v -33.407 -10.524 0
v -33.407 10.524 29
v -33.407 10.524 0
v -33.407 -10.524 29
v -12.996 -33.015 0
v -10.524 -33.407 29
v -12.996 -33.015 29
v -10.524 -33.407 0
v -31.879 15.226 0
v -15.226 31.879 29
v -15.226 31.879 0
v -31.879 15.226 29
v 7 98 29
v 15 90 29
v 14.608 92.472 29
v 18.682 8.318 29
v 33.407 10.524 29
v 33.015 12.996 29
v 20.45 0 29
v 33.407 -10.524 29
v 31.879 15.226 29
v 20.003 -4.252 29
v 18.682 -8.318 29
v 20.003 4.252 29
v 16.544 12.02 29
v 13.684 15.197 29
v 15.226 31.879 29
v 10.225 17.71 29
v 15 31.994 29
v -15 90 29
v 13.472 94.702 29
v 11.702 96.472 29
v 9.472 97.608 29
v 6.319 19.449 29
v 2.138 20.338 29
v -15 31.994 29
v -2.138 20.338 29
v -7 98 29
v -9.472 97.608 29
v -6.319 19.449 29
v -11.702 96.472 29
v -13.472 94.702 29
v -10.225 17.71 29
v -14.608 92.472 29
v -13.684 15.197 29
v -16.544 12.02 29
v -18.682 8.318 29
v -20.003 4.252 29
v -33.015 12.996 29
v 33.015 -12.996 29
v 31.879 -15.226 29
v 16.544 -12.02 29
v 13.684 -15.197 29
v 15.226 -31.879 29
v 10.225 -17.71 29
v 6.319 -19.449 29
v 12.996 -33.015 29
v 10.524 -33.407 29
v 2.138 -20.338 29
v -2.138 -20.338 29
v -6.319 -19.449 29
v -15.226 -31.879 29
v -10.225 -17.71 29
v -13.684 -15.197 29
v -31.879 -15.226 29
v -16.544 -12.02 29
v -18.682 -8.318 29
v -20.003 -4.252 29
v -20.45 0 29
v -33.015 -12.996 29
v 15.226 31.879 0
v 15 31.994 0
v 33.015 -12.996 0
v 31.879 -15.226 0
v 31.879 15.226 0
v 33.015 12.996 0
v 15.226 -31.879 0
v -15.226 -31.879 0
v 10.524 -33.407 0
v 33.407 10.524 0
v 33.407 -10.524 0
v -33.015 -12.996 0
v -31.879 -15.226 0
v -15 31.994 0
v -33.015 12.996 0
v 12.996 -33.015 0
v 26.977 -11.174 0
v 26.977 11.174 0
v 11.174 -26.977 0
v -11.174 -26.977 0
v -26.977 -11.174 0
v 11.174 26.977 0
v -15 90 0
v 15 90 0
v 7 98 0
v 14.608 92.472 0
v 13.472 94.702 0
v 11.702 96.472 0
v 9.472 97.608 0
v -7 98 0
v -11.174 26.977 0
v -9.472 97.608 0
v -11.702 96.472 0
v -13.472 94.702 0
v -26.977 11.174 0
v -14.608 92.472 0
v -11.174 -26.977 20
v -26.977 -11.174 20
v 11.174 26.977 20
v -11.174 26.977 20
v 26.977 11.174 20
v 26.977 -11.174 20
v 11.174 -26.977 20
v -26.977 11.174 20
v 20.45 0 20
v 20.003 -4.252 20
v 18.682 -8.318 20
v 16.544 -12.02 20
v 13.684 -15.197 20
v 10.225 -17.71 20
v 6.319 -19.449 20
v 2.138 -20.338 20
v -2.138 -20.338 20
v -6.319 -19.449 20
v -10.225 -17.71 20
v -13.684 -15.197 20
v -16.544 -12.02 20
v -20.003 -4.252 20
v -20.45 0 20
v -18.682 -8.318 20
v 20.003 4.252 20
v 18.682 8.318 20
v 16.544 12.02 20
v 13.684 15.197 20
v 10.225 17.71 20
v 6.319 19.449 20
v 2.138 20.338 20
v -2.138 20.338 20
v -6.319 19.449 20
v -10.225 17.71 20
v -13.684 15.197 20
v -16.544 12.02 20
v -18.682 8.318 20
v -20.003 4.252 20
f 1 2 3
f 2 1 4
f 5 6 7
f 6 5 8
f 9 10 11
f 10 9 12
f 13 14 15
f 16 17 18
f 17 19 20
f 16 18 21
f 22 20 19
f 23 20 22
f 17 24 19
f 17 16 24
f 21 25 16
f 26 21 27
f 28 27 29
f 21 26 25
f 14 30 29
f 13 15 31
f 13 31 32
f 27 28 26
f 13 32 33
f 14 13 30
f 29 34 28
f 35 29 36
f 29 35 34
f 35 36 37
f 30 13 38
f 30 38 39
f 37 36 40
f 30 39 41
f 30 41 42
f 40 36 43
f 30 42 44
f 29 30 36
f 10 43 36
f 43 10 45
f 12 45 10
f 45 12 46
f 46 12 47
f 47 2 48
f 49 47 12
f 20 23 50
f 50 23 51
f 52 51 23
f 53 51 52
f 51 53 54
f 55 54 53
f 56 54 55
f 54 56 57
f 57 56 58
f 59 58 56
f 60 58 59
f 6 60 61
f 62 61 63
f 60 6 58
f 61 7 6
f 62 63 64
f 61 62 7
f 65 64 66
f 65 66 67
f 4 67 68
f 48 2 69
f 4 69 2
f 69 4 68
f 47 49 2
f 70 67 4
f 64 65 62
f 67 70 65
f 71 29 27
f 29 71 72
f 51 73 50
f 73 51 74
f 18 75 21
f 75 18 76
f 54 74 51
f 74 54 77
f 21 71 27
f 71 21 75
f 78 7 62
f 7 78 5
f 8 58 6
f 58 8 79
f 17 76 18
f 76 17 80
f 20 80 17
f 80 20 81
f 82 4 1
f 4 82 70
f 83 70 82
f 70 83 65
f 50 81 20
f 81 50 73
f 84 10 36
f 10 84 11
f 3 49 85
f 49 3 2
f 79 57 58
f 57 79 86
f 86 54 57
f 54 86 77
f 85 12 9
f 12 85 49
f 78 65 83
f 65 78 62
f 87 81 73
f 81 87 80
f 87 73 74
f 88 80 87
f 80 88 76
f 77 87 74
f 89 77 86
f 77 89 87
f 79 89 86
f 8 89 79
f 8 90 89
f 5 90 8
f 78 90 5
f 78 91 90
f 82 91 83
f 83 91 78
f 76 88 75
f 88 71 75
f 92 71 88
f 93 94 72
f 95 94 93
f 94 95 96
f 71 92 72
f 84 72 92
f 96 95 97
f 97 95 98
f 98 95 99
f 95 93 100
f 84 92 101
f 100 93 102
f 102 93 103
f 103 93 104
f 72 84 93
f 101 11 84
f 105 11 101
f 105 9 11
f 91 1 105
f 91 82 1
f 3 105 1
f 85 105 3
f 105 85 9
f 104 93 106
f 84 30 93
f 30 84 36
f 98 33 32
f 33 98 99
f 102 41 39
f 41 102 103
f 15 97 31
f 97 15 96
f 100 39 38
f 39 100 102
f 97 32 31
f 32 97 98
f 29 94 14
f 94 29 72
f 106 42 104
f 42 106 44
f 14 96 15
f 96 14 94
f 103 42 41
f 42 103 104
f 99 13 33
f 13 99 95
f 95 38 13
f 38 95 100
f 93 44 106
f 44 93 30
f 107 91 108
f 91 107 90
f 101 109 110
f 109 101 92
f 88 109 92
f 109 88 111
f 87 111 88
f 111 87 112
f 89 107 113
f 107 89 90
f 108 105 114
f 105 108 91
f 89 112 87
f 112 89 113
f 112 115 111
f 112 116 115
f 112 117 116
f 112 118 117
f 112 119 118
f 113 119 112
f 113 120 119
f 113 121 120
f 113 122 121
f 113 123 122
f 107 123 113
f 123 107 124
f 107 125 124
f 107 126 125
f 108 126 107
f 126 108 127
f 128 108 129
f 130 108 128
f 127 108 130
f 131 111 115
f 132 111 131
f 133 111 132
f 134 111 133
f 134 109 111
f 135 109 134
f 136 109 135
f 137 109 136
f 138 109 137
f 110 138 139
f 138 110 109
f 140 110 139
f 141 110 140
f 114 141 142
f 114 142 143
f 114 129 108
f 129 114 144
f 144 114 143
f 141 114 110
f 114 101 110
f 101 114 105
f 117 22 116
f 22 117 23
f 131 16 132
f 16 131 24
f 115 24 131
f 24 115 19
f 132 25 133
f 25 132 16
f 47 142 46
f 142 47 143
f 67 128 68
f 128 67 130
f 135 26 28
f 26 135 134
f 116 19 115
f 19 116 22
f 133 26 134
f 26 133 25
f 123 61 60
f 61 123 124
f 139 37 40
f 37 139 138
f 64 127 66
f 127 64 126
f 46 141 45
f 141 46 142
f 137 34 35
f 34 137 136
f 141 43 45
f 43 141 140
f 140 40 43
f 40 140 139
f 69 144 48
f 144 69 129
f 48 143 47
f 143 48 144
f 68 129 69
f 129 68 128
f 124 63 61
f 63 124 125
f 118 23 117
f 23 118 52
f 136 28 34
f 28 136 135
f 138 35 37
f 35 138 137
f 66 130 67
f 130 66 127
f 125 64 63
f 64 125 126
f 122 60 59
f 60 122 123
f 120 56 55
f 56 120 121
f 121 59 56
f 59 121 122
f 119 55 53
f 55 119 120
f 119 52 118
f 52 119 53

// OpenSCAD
he = 9; // height of the end of the tap
ho = 20; // height of the octogram cylinder
do = 58.4; // diameter of the octogram inscribed circle 54/cos(360/16)
aa = 360/16; // rotation for alignment
wb = 30; // width of the bar
lb = 90; // length of the bar to the center
rb = 8; // fillet radius of the bar
echo(do);

difference() {
    union() { 
        minkowski(){
            $fn=20;
            cylinder(h=1e-14, r=8);
            rotate([0,0,aa]) cylinder(h=he+ho, d=55, $fn=8);
        }
        minkowski() {
            $fn=20;
            cylinder(h=1e-14, r=rb);
            translate([-wb/2+rb,0,0]) cube([wb-2*rb,lb,he+ho]);
        }
    }
    union() {
        rotate([0,0,aa]) cylinder(h=ho, d=do, $fn=8);
        translate([0,0,ho]) cylinder(h=he, d=40.9);
    }
}
